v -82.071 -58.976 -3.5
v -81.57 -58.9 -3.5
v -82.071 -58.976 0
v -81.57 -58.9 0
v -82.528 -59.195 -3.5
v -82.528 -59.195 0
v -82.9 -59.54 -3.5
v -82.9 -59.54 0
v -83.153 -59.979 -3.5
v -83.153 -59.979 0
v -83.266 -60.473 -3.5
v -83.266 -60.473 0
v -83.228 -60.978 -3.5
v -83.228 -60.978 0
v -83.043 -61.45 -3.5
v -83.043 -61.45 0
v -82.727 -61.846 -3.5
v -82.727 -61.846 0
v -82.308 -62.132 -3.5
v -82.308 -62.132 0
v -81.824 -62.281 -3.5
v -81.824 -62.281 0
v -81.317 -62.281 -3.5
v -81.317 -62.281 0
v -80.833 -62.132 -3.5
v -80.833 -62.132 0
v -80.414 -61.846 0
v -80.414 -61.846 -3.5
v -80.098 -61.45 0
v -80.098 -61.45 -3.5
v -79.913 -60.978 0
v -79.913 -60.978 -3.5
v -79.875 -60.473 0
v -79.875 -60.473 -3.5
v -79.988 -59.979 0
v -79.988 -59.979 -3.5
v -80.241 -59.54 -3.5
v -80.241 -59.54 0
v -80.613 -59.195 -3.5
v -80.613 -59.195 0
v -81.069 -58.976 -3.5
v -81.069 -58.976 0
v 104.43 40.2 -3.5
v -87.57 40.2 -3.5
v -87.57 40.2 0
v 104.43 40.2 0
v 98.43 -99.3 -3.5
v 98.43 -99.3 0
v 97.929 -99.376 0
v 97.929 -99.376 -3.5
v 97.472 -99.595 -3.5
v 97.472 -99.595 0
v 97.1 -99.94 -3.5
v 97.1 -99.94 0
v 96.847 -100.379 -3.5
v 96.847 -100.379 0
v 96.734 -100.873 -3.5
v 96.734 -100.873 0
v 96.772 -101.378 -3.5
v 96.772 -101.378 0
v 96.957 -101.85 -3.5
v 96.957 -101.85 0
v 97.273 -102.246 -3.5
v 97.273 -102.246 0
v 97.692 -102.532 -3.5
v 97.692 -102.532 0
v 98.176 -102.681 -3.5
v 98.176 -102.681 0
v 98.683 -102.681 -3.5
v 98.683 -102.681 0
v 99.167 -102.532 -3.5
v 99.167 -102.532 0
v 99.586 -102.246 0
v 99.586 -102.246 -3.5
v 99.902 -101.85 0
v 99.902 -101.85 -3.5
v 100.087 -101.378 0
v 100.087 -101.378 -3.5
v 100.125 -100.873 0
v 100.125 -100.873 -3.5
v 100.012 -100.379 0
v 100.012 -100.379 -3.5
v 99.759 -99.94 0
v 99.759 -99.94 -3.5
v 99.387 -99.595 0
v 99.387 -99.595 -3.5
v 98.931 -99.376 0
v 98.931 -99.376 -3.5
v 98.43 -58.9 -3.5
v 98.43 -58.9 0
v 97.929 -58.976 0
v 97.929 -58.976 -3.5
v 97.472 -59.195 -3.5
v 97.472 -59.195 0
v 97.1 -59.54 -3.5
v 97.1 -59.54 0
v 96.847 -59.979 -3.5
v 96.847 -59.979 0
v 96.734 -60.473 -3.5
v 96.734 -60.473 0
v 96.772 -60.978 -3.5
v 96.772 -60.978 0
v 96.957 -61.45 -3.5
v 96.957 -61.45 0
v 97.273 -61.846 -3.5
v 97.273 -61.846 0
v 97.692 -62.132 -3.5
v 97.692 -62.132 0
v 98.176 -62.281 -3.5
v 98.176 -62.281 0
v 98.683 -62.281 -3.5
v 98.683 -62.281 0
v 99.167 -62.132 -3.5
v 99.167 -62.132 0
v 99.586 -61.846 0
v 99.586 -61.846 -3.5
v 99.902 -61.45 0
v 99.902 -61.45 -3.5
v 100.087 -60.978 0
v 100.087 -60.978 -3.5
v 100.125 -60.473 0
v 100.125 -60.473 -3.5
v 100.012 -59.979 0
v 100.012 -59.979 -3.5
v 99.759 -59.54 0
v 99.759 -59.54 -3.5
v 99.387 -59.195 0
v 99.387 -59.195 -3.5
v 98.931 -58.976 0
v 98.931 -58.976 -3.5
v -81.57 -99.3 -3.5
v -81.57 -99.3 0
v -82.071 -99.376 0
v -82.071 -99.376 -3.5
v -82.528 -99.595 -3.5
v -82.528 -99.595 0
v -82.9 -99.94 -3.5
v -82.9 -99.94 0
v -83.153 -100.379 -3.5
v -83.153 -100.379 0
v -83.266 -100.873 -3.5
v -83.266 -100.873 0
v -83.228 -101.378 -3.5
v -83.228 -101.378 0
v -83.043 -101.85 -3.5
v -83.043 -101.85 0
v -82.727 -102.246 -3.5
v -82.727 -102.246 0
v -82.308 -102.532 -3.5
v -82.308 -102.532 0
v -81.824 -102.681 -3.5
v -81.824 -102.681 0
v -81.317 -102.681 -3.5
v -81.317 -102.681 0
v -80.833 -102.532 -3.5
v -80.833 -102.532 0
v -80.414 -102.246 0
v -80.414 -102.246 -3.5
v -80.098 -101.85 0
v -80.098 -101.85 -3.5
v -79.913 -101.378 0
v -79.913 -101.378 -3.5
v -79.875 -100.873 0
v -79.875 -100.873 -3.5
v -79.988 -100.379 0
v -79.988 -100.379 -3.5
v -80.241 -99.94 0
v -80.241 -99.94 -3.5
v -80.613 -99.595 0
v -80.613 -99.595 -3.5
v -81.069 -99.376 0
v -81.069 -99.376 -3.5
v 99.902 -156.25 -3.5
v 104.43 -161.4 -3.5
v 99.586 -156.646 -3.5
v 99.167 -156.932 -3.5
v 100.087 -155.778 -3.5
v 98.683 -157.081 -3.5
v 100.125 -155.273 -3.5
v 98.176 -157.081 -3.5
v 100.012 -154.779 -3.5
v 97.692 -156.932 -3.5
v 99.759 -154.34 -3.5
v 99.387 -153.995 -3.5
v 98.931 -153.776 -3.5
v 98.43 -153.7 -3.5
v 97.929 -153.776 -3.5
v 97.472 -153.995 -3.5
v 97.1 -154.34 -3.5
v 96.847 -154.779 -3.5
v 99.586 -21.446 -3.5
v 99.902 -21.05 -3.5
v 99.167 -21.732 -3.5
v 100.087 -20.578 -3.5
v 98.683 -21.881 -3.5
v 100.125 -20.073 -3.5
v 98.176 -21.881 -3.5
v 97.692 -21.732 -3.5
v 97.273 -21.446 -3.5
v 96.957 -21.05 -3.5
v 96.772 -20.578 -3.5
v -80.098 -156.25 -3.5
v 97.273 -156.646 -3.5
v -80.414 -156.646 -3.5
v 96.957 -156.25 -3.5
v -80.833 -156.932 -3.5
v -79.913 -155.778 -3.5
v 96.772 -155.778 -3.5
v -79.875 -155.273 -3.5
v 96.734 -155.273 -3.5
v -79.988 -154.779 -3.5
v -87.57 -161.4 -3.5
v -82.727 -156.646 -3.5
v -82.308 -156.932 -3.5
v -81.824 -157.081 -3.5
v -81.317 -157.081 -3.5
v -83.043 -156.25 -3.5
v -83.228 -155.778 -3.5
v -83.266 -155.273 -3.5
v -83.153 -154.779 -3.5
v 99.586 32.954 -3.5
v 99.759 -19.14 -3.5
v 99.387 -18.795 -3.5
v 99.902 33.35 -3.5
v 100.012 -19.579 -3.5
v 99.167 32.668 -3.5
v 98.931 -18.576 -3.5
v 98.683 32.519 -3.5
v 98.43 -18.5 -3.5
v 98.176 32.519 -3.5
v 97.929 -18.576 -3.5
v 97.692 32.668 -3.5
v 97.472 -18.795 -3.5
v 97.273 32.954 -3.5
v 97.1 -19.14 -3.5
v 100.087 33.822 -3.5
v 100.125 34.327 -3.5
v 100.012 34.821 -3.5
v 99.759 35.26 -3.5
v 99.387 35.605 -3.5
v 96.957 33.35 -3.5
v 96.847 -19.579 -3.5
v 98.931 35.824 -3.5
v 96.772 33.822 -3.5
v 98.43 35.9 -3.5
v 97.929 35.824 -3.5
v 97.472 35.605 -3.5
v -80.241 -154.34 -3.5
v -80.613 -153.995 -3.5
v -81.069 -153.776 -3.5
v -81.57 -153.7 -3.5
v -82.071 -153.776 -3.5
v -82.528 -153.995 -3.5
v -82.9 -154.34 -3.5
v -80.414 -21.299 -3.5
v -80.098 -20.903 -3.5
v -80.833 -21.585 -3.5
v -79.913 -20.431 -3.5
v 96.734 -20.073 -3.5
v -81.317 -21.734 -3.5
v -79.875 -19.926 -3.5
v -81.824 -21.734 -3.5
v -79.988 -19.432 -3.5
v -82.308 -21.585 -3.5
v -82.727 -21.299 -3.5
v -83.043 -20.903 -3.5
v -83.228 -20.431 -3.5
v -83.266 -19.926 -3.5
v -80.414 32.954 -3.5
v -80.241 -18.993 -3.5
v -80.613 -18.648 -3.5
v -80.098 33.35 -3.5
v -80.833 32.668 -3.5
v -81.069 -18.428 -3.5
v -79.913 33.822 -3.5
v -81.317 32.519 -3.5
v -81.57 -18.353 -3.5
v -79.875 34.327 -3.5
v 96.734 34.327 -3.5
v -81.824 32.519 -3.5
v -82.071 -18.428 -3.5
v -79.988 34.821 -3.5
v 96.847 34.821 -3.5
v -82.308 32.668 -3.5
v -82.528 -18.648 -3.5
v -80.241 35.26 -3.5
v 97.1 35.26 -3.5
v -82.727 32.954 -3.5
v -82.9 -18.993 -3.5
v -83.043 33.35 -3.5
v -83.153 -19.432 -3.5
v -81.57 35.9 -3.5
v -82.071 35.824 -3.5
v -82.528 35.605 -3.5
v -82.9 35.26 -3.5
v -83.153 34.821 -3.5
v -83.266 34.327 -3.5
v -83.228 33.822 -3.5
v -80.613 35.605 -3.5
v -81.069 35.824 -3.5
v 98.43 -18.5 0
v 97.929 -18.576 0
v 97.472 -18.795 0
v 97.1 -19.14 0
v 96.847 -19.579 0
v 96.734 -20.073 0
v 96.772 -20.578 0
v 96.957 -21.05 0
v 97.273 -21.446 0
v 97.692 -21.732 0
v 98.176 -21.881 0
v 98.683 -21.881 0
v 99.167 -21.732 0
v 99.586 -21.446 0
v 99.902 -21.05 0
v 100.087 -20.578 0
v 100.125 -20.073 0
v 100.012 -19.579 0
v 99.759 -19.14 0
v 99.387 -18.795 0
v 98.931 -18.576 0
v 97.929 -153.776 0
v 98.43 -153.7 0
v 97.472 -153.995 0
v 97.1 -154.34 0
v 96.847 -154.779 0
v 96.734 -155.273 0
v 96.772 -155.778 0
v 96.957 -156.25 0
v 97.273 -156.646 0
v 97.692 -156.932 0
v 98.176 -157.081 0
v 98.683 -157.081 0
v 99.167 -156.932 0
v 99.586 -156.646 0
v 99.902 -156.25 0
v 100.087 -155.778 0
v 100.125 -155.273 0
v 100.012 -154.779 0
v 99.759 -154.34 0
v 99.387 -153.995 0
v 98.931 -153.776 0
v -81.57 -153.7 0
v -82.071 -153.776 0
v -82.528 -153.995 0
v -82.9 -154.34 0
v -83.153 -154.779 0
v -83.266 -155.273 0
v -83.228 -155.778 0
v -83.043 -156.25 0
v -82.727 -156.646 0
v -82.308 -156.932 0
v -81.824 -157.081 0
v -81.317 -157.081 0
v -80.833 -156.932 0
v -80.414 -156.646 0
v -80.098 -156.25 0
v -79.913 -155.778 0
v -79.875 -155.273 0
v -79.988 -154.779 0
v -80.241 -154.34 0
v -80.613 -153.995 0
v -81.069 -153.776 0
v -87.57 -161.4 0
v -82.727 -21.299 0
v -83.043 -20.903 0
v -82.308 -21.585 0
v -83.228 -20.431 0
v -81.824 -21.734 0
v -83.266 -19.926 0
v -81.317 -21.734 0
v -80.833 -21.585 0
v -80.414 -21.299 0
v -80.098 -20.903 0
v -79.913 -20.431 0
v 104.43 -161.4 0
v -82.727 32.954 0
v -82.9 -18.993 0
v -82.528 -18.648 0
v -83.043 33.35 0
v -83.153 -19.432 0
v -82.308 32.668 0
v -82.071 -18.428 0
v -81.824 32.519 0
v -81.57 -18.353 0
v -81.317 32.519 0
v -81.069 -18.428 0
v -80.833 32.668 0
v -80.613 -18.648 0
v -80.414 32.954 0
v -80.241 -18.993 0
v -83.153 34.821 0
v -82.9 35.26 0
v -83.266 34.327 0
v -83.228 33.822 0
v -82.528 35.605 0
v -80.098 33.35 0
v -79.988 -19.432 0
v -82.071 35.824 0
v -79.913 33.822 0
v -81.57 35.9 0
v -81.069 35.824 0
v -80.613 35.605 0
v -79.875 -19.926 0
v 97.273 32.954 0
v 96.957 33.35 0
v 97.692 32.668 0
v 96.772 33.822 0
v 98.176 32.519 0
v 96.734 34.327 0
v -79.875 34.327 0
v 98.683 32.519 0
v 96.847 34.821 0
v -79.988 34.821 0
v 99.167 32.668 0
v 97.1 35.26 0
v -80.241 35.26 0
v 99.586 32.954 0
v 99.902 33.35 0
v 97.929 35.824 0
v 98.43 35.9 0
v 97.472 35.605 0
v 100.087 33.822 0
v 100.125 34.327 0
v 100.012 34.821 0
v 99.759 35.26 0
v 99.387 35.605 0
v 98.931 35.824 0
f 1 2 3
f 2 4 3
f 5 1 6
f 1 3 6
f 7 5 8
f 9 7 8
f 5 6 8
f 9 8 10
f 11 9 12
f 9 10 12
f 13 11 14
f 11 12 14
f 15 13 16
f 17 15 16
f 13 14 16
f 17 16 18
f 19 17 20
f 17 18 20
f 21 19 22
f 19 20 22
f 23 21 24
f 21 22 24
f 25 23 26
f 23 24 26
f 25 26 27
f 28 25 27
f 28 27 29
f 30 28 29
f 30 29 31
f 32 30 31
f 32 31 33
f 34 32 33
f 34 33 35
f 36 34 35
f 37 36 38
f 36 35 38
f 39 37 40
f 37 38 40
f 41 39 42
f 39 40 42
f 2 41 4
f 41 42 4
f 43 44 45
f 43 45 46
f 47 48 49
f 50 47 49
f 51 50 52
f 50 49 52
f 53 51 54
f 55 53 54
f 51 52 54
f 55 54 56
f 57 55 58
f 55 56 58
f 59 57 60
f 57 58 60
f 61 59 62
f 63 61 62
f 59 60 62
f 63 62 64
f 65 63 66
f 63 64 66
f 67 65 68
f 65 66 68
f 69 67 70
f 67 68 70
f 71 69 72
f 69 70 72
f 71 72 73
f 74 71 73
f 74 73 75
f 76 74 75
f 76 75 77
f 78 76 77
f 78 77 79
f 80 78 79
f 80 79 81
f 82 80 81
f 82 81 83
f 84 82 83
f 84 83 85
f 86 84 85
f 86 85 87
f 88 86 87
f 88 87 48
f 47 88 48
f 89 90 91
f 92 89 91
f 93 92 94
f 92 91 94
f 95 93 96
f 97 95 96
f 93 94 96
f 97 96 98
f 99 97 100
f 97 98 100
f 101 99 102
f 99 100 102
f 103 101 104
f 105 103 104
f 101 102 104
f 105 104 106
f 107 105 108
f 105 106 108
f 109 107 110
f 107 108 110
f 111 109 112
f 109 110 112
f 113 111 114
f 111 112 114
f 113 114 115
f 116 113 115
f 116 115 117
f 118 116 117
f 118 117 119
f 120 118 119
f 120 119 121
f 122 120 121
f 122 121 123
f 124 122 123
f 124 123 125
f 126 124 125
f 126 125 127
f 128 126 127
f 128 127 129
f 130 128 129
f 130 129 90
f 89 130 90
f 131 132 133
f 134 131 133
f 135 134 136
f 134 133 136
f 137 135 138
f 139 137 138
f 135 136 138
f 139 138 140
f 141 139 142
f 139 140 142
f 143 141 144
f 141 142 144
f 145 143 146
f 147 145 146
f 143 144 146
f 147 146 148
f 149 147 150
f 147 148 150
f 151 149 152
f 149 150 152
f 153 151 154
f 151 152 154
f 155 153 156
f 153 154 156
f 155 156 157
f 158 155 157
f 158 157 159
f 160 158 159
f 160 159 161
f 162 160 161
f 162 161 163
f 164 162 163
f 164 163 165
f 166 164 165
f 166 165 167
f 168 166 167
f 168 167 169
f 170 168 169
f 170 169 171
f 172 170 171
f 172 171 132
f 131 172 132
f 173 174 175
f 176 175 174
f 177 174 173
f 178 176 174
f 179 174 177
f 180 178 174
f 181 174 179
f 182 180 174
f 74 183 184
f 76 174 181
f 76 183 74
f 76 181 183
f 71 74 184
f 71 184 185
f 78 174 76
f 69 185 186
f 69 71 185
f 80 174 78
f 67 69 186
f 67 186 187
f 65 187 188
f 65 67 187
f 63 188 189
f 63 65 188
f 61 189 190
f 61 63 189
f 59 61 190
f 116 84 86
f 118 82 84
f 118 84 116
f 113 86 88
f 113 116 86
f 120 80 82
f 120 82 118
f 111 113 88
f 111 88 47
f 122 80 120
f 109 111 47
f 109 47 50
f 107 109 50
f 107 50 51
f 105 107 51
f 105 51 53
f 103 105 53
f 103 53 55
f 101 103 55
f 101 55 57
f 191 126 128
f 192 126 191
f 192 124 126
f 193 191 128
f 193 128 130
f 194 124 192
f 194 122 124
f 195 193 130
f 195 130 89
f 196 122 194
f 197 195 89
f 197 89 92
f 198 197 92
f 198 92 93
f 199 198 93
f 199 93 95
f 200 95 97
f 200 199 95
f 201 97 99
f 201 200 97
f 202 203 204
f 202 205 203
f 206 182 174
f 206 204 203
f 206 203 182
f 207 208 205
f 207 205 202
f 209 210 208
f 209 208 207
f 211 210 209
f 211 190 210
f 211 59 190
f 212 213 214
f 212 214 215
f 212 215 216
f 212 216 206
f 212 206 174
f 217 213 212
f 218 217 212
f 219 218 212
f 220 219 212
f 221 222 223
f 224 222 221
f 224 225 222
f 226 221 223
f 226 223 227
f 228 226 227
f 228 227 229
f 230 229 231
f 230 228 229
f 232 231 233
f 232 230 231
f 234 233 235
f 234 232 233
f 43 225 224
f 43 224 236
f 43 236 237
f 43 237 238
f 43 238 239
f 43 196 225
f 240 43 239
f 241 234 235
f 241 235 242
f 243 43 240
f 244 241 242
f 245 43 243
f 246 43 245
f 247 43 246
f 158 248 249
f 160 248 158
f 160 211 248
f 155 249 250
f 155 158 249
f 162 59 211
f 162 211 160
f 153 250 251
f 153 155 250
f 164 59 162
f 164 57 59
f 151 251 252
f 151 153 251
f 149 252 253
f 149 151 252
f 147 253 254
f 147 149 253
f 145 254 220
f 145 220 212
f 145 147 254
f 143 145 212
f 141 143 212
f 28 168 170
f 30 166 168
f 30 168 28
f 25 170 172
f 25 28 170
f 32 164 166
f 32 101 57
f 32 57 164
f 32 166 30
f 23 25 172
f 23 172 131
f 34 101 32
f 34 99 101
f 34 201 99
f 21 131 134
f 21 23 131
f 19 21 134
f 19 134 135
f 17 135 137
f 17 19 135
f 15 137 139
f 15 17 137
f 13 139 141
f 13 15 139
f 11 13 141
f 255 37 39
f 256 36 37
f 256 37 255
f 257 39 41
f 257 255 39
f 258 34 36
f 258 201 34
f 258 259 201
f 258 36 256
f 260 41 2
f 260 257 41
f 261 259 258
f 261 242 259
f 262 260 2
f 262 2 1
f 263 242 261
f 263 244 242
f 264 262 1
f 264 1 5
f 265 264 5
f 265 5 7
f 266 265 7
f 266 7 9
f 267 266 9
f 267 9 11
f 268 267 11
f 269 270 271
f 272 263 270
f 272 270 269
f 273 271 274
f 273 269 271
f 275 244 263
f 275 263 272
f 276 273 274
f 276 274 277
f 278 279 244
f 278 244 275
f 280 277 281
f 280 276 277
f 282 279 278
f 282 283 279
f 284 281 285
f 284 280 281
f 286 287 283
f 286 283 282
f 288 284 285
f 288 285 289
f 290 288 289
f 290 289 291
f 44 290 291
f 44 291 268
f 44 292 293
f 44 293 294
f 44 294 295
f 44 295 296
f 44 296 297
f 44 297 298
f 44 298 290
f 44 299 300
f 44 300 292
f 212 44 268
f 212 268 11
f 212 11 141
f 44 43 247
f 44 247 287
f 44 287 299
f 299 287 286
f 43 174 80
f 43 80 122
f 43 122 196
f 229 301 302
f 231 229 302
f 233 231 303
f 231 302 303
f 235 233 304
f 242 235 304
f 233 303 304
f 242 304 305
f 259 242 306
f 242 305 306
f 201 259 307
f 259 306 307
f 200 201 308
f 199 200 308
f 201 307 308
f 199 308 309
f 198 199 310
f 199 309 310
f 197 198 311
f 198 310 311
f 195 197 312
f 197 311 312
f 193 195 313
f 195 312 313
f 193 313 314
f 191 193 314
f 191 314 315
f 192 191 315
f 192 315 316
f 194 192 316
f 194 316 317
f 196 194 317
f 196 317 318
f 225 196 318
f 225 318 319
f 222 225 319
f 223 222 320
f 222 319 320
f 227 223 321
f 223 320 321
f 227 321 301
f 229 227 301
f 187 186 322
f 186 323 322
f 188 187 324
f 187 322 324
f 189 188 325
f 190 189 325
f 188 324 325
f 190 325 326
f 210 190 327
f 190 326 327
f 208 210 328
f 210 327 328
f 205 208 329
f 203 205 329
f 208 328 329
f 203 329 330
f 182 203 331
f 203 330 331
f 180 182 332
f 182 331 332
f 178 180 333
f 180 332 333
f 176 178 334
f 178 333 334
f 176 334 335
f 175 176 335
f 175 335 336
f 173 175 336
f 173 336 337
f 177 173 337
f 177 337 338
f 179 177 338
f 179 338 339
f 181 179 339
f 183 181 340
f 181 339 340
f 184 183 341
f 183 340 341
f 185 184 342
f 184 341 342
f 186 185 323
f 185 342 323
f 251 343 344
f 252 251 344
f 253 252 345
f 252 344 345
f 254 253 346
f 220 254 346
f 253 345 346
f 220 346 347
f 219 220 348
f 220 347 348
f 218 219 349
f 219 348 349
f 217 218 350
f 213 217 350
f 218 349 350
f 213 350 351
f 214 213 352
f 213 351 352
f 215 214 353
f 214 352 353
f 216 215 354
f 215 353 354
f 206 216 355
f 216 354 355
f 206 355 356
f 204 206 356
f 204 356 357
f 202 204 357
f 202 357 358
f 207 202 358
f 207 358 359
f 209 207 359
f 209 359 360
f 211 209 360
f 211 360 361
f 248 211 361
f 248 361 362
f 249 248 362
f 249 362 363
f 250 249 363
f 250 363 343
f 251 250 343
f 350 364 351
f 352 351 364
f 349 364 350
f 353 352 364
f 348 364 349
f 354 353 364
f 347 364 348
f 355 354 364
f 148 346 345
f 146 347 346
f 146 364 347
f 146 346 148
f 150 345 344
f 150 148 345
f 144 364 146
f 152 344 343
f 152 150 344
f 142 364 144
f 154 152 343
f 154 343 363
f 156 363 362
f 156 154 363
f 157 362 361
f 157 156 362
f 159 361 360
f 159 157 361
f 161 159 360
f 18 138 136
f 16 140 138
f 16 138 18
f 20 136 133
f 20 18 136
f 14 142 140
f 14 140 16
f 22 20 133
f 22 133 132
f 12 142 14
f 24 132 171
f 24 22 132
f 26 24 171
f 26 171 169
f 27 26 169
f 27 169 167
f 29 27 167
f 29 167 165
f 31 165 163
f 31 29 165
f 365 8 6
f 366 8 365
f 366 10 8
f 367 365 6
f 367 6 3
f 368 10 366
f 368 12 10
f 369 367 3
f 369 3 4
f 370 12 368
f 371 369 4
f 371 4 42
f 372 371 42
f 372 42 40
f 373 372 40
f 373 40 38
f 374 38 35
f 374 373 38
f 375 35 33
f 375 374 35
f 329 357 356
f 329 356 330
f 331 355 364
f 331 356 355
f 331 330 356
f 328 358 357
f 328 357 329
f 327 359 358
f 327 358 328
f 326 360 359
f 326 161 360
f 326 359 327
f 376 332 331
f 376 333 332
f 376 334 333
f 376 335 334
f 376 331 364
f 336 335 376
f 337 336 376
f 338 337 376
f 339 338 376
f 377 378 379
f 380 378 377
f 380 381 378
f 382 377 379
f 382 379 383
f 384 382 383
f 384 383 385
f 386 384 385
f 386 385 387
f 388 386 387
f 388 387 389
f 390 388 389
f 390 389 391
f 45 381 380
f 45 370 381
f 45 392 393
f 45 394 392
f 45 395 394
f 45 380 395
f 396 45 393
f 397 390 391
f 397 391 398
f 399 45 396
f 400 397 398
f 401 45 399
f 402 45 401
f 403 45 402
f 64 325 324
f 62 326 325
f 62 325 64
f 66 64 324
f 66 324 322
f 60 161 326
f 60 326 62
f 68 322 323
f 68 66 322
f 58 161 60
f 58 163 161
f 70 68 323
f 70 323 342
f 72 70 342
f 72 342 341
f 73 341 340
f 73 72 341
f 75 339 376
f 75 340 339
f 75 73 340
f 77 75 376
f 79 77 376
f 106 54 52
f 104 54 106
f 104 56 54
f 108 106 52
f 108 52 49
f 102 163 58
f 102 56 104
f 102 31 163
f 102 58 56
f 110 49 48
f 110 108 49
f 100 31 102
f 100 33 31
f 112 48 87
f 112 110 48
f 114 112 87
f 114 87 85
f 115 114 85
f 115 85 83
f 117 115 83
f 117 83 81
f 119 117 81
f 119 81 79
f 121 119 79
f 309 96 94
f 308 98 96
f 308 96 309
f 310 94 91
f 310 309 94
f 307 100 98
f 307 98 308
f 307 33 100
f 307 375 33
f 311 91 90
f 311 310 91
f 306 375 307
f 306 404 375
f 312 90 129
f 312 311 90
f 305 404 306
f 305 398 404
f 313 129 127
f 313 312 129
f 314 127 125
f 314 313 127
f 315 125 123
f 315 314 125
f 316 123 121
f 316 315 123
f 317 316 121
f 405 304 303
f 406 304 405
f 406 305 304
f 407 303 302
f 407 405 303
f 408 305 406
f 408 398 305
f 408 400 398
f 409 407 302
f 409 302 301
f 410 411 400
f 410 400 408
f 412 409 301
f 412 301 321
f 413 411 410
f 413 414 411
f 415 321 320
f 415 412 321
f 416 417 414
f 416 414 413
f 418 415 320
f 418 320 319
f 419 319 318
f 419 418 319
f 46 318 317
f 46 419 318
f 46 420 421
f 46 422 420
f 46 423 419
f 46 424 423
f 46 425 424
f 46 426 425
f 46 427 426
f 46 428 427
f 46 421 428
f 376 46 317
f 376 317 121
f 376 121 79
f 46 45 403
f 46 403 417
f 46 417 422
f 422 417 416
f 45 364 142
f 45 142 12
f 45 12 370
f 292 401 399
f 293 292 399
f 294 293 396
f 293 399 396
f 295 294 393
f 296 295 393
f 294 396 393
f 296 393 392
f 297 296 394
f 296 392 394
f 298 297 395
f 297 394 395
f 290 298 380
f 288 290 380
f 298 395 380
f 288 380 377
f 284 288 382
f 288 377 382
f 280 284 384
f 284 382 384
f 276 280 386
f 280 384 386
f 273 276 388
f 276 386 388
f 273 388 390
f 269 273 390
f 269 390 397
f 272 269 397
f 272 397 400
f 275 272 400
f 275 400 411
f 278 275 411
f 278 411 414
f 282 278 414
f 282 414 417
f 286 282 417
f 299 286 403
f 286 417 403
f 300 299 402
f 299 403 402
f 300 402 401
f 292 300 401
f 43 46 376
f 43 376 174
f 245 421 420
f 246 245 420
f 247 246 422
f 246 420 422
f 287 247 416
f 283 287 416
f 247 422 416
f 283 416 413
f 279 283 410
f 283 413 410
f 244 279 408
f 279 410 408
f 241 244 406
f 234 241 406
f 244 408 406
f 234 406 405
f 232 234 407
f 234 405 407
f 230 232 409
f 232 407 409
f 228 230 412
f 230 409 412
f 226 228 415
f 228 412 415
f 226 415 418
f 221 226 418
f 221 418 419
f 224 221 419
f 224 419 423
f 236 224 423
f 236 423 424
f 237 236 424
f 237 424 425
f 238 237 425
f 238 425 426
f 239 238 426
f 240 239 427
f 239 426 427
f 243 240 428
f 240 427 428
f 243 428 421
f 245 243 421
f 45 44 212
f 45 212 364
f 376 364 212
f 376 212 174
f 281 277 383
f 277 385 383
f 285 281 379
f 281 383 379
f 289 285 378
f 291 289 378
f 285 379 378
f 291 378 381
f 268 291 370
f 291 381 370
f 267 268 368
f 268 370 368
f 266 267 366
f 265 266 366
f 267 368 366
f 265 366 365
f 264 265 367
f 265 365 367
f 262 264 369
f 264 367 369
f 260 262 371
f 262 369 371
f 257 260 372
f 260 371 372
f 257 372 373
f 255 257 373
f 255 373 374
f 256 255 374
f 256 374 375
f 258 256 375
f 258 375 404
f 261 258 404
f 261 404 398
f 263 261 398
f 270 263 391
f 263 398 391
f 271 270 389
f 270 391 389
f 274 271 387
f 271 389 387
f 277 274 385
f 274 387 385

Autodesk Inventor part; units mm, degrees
ref_plane "YZ Plane" through (0, 0, 0) normal (1, 0, 0) x (0, 1, 0)
ref_plane "XZ Plane" through (0, 0, 0) normal (0, 1, 0) x (-1, 0, 0)
ref_plane "XY Plane" through (0, 0, 0) normal (0, 0, 1) x (1, 0, 0)
sketch "Sketch1" plane through (0, 0, 0) normal (0, 0, 1) x (1, 0, 0)
  line L0 (93.3916, -12.6) -> (93.3916, 12.6)
  line L1 (53.9763, -12.6) -> (93.3916, -12.6)
  line L2 (53.9763, -15.2) -> (53.9763, -12.6)
  line L3 (38.2753, -15.2) -> (53.9763, -15.2)
  line L4 (38.2753, -15.2) -> (23.4296, -15.2)
  line L5 (23.4296, -12.6) -> (23.4296, -15.2)
  line L6 (-76.0546, -12.6) -> (23.4296, -12.6)
  line L7 (23.4296, 12.6) -> (-76.0546, 12.6)
  line L8 (23.4296, 15.2) -> (23.4296, 12.6)
  line L9 (-76.0546, 12.6) -> (-76.0546, -12.6)
  line L10 (-70.1, 10) -> (-66.9, 10)
  line L11 (-66.9, -10) -> (-70.1, -10)
  line L12 (23.4296, 15.2) -> (53.9763, 15.2)
  line L13 (53.9763, 15.2) -> (53.9763, 12.6)
  line L14 (53.9763, 12.6) -> (93.3916, 12.6)
  line L15 (-77.0546, 13.6) -> (22.4296, 13.6)
  line L16 (22.4296, 13.6) -> (22.4296, 16.2)
  line L17 (22.4296, 16.2) -> (54.9763, 16.2)
  line L18 (54.9763, 16.2) -> (54.9763, 13.6)
  line L19 (54.9763, 13.6) -> (94.3916, 13.6)
  line L20 (94.3916, 13.6) -> (94.3916, -13.6)
  line L21 (94.3916, -13.6) -> (54.9763, -13.6)
  line L22 (54.9763, -13.6) -> (54.9763, -16.2)
  line L23 (54.9763, -16.2) -> (38.2753, -16.2)
  line L24 (38.2753, -16.2) -> (22.4296, -16.2)
  line L25 (22.4296, -16.2) -> (22.4296, -13.6)
  line L26 (22.4296, -13.6) -> (-77.0546, -13.6)
  line L27 (-77.0546, -13.6) -> (-77.0546, 13.6)
  line L28 (22.4296, -16.2) -> (22.4296, -20.2) construction
  line L29 (22.4296, -20.2) -> (-87.5704, -20.2)
  line L30 (-87.5704, -20.2) -> (-87.5704, 20.2)
  line L31 (-87.5704, 20.2) -> (22.4296, 20.2)
  line L32 (104.4296, -20.2) -> (22.4296, -20.2)
  line L33 (22.4296, 20.2) -> (104.4296, 20.2)
  line L34 (104.4296, 20.2) -> (104.4296, -20.2)
  dimension "d0" = 1
  dimension "d1" = 4
  dimension "d2" = 110
  dimension "d3" = 40.4
  dimension "d5" = 82
extrude "Extrusion1" add sketch "Sketch1" against normal blind 3.5 contours L1 L2 L3 L4 L5 L6 L9 L7 L8 L12 L13 L14 L0 | L15 L16 L17 L18 L19 L20 L21 L22 L23 L24 L25 L26 L27 | L29 L30 L31 L33 L34 L32
pattern_linear "Rectangular Pattern1" count 4 spacing 40.4 along (0, -1, 0)
sketch "Sketch2" plane through (-87.5704, 20.2, 0) normal (0, 1, 0) x (1, 0, 0)
  line L0 (192, 3.5) -> (192, 0) projected
  line L1 (192, 0) -> (0, 0) projected
  line L2 (0, 0) -> (0, 3.5) projected
  line L3 (0, 3.5) -> (192, 3.5) projected
  point P0 (87.5704, 0)
extrude "Extrusion2" add sketch "Sketch2" along normal blind 20
sketch "Sketch3" plane through (-87.5704, -141.4, 0) normal (0, -1, 0) x (1, 0, 0)
  line L0 (192, 0) -> (192, -3.5) projected
  line L1 (192, -3.5) -> (0, -3.5) projected
  line L2 (0, -3.5) -> (0, 0) projected
  line L3 (0, 0) -> (192, 0) projected
  point P0 (87.5704, 0)
extrude "Extrusion3" add sketch "Sketch3" along normal blind 20
sketch "Sketch4" plane through (0, 0, -3.5) normal (0, 0, -1) x (-1, 0, 0)
  line L0 (87.5704, -161.4) -> (-104.4296, -161.4) projected
  line L1 (87.5704, -161.4) -> (81.5704, -161.4)
  line L2 (81.5704, -161.4) -> (81.5704, 40.2)
  line L3 (-104.4296, 40.2) -> (87.5704, 40.2) projected
  line L4 (81.5704, -161.4) -> (81.5704, -155.4)
  line L5 (81.5704, 40.2) -> (81.5704, 34.2)
  line L6 (77.0546, -107.6) -> (-22.4296, -107.6) projected
  line L7 (77.0546, -67.2) -> (77.0546, -94.4) projected
  line L8 (77.0546, -107.6) -> (77.0546, -94.4)
  line L9 (77.0546, -101) -> (81.5704, -101)
  line L10 (77.0546, -67.2) -> (77.0546, -53.8327)
  line L11 (77.0546, -60.5163) -> (81.5704, -60.6)
  line L12 (77.0546, -54) -> (77.0546, -26.8) projected
  line L13 (77.0546, -26.8) -> (77.0546, -13.3059)
  line L14 (77.0546, -20.0529) -> (81.5704, -20.0529)
  line L15 (-94.3916, -107.6) -> (-54.9763, -107.6) projected
  line L16 (-94.3916, -67.2) -> (-94.3916, -94.4) projected
  line L17 (-94.3916, -107.6) -> (-94.3916, -94.4)
  line L18 (-54.9763, -54) -> (-94.3916, -54) projected
  line L19 (-94.3916, -67.2) -> (-94.3916, -54)
  line L20 (-54.9763, -13.6) -> (-94.3916, -13.6) projected
  line L21 (-94.3916, -13.6) -> (-94.3916, 13.6) projected
  line L22 (-94.3916, -13.6) -> (-94.3916, 13.6)
  line L23 (-104.4296, -161.4) -> (-98.4296, -161.4)
  line L24 (-98.4296, -161.4) -> (-98.4296, 40.2)
  line L25 (-94.3916, -101) -> (-98.4296, -101)
  line L26 (-94.3916, -60.6) -> (-98.4296, -60.6)
  line L27 (-94.3916, -26.8) -> (-94.3916, -13.6)
  line L28 (-94.3916, -20.2) -> (-98.4296, -20.2)
  line L29 (-98.4296, 40.2) -> (-98.4296, 34.2)
  line L30 (-98.4296, -161.4) -> (-98.4296, -155.4)
  point P0 (0, 0)
  dimension "d15" = 6
  dimension "d16" = 6
  dimension "d17" = 6
  dimension "d18" = 6
  dimension "d19" = 6
  dimension "d20" = 6
hole "Hole1" at (98.4296, -155.4, -3.5) at (98.4296, -155.4, -3.5) at (98.4296, -101, -3.5) at (98.4296, -60.6, -3.5) at (98.4296, -20.2, -3.5) at (98.4296, 34.2, -3.5) at (-81.5704, 34.2, -3.5) at (-81.5704, -20.0529, -3.5) at (-81.5704, -60.6, -3.5) at (-81.5704, -101, -3.5) at (-81.5704, -155.4, -3.5) direction (0, 0, 1) diameter 3.4 end through all clearance for "Flat Head Machine Screw" size "M3" standard "Ansi Metric M Profile"
properties part number "BottomPlate-4x1"
